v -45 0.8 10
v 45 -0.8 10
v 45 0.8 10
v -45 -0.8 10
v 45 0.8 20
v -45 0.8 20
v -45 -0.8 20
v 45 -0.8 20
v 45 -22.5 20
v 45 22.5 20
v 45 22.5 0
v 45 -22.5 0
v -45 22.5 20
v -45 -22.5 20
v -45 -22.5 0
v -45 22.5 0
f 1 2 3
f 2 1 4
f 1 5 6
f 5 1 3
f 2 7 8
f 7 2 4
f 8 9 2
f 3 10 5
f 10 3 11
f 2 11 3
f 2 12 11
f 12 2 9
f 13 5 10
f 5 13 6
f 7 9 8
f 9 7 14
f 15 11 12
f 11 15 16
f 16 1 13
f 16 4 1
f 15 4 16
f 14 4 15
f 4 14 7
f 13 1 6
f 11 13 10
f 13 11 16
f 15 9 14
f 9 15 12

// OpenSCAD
// Microscope slide drying rack
// Print orientation: base block on the bed (z = 0), slots open upward.

// ---------------- Parameters ----------------
block_len    = 90;    // base block length along X (mm)
block_wid    = 45;    // base block width along Y (mm)
block_ht     = 20;    // base block height along Z (mm)

slot_count   = 10;    // number of slide slots
slot_len     = 77;    // slot length along X (mm)
slot_wid     = 1.6;   // slot width along Y (mm)
slot_depth   = 10;    // slot depth from top face (mm)
slot_pitch   = 3.5;   // centre-to-centre slot spacing along Y (mm)

eps          = 0.5;   // overshoot of cutters past faces (mm)

$fn = 64;

// ---------------- Model ----------------
difference() {
    // Base block, centred in X and Y, sitting on z = 0
    translate([-block_len / 2, -block_wid / 2, 0])
        cube([block_len, block_wid, block_ht]);

    // Parallel slots, centred as a group in X and Y
    for (i = [0 : slot_count - 1]) {
        x_c = (i - (slot_count - 1) / 2) * slot_pitch;
        translate([x_c - slot_len / 2, -slot_wid / 2, block_ht - slot_depth])
            cube([slot_len, slot_wid, slot_depth + eps]);
    }
}
